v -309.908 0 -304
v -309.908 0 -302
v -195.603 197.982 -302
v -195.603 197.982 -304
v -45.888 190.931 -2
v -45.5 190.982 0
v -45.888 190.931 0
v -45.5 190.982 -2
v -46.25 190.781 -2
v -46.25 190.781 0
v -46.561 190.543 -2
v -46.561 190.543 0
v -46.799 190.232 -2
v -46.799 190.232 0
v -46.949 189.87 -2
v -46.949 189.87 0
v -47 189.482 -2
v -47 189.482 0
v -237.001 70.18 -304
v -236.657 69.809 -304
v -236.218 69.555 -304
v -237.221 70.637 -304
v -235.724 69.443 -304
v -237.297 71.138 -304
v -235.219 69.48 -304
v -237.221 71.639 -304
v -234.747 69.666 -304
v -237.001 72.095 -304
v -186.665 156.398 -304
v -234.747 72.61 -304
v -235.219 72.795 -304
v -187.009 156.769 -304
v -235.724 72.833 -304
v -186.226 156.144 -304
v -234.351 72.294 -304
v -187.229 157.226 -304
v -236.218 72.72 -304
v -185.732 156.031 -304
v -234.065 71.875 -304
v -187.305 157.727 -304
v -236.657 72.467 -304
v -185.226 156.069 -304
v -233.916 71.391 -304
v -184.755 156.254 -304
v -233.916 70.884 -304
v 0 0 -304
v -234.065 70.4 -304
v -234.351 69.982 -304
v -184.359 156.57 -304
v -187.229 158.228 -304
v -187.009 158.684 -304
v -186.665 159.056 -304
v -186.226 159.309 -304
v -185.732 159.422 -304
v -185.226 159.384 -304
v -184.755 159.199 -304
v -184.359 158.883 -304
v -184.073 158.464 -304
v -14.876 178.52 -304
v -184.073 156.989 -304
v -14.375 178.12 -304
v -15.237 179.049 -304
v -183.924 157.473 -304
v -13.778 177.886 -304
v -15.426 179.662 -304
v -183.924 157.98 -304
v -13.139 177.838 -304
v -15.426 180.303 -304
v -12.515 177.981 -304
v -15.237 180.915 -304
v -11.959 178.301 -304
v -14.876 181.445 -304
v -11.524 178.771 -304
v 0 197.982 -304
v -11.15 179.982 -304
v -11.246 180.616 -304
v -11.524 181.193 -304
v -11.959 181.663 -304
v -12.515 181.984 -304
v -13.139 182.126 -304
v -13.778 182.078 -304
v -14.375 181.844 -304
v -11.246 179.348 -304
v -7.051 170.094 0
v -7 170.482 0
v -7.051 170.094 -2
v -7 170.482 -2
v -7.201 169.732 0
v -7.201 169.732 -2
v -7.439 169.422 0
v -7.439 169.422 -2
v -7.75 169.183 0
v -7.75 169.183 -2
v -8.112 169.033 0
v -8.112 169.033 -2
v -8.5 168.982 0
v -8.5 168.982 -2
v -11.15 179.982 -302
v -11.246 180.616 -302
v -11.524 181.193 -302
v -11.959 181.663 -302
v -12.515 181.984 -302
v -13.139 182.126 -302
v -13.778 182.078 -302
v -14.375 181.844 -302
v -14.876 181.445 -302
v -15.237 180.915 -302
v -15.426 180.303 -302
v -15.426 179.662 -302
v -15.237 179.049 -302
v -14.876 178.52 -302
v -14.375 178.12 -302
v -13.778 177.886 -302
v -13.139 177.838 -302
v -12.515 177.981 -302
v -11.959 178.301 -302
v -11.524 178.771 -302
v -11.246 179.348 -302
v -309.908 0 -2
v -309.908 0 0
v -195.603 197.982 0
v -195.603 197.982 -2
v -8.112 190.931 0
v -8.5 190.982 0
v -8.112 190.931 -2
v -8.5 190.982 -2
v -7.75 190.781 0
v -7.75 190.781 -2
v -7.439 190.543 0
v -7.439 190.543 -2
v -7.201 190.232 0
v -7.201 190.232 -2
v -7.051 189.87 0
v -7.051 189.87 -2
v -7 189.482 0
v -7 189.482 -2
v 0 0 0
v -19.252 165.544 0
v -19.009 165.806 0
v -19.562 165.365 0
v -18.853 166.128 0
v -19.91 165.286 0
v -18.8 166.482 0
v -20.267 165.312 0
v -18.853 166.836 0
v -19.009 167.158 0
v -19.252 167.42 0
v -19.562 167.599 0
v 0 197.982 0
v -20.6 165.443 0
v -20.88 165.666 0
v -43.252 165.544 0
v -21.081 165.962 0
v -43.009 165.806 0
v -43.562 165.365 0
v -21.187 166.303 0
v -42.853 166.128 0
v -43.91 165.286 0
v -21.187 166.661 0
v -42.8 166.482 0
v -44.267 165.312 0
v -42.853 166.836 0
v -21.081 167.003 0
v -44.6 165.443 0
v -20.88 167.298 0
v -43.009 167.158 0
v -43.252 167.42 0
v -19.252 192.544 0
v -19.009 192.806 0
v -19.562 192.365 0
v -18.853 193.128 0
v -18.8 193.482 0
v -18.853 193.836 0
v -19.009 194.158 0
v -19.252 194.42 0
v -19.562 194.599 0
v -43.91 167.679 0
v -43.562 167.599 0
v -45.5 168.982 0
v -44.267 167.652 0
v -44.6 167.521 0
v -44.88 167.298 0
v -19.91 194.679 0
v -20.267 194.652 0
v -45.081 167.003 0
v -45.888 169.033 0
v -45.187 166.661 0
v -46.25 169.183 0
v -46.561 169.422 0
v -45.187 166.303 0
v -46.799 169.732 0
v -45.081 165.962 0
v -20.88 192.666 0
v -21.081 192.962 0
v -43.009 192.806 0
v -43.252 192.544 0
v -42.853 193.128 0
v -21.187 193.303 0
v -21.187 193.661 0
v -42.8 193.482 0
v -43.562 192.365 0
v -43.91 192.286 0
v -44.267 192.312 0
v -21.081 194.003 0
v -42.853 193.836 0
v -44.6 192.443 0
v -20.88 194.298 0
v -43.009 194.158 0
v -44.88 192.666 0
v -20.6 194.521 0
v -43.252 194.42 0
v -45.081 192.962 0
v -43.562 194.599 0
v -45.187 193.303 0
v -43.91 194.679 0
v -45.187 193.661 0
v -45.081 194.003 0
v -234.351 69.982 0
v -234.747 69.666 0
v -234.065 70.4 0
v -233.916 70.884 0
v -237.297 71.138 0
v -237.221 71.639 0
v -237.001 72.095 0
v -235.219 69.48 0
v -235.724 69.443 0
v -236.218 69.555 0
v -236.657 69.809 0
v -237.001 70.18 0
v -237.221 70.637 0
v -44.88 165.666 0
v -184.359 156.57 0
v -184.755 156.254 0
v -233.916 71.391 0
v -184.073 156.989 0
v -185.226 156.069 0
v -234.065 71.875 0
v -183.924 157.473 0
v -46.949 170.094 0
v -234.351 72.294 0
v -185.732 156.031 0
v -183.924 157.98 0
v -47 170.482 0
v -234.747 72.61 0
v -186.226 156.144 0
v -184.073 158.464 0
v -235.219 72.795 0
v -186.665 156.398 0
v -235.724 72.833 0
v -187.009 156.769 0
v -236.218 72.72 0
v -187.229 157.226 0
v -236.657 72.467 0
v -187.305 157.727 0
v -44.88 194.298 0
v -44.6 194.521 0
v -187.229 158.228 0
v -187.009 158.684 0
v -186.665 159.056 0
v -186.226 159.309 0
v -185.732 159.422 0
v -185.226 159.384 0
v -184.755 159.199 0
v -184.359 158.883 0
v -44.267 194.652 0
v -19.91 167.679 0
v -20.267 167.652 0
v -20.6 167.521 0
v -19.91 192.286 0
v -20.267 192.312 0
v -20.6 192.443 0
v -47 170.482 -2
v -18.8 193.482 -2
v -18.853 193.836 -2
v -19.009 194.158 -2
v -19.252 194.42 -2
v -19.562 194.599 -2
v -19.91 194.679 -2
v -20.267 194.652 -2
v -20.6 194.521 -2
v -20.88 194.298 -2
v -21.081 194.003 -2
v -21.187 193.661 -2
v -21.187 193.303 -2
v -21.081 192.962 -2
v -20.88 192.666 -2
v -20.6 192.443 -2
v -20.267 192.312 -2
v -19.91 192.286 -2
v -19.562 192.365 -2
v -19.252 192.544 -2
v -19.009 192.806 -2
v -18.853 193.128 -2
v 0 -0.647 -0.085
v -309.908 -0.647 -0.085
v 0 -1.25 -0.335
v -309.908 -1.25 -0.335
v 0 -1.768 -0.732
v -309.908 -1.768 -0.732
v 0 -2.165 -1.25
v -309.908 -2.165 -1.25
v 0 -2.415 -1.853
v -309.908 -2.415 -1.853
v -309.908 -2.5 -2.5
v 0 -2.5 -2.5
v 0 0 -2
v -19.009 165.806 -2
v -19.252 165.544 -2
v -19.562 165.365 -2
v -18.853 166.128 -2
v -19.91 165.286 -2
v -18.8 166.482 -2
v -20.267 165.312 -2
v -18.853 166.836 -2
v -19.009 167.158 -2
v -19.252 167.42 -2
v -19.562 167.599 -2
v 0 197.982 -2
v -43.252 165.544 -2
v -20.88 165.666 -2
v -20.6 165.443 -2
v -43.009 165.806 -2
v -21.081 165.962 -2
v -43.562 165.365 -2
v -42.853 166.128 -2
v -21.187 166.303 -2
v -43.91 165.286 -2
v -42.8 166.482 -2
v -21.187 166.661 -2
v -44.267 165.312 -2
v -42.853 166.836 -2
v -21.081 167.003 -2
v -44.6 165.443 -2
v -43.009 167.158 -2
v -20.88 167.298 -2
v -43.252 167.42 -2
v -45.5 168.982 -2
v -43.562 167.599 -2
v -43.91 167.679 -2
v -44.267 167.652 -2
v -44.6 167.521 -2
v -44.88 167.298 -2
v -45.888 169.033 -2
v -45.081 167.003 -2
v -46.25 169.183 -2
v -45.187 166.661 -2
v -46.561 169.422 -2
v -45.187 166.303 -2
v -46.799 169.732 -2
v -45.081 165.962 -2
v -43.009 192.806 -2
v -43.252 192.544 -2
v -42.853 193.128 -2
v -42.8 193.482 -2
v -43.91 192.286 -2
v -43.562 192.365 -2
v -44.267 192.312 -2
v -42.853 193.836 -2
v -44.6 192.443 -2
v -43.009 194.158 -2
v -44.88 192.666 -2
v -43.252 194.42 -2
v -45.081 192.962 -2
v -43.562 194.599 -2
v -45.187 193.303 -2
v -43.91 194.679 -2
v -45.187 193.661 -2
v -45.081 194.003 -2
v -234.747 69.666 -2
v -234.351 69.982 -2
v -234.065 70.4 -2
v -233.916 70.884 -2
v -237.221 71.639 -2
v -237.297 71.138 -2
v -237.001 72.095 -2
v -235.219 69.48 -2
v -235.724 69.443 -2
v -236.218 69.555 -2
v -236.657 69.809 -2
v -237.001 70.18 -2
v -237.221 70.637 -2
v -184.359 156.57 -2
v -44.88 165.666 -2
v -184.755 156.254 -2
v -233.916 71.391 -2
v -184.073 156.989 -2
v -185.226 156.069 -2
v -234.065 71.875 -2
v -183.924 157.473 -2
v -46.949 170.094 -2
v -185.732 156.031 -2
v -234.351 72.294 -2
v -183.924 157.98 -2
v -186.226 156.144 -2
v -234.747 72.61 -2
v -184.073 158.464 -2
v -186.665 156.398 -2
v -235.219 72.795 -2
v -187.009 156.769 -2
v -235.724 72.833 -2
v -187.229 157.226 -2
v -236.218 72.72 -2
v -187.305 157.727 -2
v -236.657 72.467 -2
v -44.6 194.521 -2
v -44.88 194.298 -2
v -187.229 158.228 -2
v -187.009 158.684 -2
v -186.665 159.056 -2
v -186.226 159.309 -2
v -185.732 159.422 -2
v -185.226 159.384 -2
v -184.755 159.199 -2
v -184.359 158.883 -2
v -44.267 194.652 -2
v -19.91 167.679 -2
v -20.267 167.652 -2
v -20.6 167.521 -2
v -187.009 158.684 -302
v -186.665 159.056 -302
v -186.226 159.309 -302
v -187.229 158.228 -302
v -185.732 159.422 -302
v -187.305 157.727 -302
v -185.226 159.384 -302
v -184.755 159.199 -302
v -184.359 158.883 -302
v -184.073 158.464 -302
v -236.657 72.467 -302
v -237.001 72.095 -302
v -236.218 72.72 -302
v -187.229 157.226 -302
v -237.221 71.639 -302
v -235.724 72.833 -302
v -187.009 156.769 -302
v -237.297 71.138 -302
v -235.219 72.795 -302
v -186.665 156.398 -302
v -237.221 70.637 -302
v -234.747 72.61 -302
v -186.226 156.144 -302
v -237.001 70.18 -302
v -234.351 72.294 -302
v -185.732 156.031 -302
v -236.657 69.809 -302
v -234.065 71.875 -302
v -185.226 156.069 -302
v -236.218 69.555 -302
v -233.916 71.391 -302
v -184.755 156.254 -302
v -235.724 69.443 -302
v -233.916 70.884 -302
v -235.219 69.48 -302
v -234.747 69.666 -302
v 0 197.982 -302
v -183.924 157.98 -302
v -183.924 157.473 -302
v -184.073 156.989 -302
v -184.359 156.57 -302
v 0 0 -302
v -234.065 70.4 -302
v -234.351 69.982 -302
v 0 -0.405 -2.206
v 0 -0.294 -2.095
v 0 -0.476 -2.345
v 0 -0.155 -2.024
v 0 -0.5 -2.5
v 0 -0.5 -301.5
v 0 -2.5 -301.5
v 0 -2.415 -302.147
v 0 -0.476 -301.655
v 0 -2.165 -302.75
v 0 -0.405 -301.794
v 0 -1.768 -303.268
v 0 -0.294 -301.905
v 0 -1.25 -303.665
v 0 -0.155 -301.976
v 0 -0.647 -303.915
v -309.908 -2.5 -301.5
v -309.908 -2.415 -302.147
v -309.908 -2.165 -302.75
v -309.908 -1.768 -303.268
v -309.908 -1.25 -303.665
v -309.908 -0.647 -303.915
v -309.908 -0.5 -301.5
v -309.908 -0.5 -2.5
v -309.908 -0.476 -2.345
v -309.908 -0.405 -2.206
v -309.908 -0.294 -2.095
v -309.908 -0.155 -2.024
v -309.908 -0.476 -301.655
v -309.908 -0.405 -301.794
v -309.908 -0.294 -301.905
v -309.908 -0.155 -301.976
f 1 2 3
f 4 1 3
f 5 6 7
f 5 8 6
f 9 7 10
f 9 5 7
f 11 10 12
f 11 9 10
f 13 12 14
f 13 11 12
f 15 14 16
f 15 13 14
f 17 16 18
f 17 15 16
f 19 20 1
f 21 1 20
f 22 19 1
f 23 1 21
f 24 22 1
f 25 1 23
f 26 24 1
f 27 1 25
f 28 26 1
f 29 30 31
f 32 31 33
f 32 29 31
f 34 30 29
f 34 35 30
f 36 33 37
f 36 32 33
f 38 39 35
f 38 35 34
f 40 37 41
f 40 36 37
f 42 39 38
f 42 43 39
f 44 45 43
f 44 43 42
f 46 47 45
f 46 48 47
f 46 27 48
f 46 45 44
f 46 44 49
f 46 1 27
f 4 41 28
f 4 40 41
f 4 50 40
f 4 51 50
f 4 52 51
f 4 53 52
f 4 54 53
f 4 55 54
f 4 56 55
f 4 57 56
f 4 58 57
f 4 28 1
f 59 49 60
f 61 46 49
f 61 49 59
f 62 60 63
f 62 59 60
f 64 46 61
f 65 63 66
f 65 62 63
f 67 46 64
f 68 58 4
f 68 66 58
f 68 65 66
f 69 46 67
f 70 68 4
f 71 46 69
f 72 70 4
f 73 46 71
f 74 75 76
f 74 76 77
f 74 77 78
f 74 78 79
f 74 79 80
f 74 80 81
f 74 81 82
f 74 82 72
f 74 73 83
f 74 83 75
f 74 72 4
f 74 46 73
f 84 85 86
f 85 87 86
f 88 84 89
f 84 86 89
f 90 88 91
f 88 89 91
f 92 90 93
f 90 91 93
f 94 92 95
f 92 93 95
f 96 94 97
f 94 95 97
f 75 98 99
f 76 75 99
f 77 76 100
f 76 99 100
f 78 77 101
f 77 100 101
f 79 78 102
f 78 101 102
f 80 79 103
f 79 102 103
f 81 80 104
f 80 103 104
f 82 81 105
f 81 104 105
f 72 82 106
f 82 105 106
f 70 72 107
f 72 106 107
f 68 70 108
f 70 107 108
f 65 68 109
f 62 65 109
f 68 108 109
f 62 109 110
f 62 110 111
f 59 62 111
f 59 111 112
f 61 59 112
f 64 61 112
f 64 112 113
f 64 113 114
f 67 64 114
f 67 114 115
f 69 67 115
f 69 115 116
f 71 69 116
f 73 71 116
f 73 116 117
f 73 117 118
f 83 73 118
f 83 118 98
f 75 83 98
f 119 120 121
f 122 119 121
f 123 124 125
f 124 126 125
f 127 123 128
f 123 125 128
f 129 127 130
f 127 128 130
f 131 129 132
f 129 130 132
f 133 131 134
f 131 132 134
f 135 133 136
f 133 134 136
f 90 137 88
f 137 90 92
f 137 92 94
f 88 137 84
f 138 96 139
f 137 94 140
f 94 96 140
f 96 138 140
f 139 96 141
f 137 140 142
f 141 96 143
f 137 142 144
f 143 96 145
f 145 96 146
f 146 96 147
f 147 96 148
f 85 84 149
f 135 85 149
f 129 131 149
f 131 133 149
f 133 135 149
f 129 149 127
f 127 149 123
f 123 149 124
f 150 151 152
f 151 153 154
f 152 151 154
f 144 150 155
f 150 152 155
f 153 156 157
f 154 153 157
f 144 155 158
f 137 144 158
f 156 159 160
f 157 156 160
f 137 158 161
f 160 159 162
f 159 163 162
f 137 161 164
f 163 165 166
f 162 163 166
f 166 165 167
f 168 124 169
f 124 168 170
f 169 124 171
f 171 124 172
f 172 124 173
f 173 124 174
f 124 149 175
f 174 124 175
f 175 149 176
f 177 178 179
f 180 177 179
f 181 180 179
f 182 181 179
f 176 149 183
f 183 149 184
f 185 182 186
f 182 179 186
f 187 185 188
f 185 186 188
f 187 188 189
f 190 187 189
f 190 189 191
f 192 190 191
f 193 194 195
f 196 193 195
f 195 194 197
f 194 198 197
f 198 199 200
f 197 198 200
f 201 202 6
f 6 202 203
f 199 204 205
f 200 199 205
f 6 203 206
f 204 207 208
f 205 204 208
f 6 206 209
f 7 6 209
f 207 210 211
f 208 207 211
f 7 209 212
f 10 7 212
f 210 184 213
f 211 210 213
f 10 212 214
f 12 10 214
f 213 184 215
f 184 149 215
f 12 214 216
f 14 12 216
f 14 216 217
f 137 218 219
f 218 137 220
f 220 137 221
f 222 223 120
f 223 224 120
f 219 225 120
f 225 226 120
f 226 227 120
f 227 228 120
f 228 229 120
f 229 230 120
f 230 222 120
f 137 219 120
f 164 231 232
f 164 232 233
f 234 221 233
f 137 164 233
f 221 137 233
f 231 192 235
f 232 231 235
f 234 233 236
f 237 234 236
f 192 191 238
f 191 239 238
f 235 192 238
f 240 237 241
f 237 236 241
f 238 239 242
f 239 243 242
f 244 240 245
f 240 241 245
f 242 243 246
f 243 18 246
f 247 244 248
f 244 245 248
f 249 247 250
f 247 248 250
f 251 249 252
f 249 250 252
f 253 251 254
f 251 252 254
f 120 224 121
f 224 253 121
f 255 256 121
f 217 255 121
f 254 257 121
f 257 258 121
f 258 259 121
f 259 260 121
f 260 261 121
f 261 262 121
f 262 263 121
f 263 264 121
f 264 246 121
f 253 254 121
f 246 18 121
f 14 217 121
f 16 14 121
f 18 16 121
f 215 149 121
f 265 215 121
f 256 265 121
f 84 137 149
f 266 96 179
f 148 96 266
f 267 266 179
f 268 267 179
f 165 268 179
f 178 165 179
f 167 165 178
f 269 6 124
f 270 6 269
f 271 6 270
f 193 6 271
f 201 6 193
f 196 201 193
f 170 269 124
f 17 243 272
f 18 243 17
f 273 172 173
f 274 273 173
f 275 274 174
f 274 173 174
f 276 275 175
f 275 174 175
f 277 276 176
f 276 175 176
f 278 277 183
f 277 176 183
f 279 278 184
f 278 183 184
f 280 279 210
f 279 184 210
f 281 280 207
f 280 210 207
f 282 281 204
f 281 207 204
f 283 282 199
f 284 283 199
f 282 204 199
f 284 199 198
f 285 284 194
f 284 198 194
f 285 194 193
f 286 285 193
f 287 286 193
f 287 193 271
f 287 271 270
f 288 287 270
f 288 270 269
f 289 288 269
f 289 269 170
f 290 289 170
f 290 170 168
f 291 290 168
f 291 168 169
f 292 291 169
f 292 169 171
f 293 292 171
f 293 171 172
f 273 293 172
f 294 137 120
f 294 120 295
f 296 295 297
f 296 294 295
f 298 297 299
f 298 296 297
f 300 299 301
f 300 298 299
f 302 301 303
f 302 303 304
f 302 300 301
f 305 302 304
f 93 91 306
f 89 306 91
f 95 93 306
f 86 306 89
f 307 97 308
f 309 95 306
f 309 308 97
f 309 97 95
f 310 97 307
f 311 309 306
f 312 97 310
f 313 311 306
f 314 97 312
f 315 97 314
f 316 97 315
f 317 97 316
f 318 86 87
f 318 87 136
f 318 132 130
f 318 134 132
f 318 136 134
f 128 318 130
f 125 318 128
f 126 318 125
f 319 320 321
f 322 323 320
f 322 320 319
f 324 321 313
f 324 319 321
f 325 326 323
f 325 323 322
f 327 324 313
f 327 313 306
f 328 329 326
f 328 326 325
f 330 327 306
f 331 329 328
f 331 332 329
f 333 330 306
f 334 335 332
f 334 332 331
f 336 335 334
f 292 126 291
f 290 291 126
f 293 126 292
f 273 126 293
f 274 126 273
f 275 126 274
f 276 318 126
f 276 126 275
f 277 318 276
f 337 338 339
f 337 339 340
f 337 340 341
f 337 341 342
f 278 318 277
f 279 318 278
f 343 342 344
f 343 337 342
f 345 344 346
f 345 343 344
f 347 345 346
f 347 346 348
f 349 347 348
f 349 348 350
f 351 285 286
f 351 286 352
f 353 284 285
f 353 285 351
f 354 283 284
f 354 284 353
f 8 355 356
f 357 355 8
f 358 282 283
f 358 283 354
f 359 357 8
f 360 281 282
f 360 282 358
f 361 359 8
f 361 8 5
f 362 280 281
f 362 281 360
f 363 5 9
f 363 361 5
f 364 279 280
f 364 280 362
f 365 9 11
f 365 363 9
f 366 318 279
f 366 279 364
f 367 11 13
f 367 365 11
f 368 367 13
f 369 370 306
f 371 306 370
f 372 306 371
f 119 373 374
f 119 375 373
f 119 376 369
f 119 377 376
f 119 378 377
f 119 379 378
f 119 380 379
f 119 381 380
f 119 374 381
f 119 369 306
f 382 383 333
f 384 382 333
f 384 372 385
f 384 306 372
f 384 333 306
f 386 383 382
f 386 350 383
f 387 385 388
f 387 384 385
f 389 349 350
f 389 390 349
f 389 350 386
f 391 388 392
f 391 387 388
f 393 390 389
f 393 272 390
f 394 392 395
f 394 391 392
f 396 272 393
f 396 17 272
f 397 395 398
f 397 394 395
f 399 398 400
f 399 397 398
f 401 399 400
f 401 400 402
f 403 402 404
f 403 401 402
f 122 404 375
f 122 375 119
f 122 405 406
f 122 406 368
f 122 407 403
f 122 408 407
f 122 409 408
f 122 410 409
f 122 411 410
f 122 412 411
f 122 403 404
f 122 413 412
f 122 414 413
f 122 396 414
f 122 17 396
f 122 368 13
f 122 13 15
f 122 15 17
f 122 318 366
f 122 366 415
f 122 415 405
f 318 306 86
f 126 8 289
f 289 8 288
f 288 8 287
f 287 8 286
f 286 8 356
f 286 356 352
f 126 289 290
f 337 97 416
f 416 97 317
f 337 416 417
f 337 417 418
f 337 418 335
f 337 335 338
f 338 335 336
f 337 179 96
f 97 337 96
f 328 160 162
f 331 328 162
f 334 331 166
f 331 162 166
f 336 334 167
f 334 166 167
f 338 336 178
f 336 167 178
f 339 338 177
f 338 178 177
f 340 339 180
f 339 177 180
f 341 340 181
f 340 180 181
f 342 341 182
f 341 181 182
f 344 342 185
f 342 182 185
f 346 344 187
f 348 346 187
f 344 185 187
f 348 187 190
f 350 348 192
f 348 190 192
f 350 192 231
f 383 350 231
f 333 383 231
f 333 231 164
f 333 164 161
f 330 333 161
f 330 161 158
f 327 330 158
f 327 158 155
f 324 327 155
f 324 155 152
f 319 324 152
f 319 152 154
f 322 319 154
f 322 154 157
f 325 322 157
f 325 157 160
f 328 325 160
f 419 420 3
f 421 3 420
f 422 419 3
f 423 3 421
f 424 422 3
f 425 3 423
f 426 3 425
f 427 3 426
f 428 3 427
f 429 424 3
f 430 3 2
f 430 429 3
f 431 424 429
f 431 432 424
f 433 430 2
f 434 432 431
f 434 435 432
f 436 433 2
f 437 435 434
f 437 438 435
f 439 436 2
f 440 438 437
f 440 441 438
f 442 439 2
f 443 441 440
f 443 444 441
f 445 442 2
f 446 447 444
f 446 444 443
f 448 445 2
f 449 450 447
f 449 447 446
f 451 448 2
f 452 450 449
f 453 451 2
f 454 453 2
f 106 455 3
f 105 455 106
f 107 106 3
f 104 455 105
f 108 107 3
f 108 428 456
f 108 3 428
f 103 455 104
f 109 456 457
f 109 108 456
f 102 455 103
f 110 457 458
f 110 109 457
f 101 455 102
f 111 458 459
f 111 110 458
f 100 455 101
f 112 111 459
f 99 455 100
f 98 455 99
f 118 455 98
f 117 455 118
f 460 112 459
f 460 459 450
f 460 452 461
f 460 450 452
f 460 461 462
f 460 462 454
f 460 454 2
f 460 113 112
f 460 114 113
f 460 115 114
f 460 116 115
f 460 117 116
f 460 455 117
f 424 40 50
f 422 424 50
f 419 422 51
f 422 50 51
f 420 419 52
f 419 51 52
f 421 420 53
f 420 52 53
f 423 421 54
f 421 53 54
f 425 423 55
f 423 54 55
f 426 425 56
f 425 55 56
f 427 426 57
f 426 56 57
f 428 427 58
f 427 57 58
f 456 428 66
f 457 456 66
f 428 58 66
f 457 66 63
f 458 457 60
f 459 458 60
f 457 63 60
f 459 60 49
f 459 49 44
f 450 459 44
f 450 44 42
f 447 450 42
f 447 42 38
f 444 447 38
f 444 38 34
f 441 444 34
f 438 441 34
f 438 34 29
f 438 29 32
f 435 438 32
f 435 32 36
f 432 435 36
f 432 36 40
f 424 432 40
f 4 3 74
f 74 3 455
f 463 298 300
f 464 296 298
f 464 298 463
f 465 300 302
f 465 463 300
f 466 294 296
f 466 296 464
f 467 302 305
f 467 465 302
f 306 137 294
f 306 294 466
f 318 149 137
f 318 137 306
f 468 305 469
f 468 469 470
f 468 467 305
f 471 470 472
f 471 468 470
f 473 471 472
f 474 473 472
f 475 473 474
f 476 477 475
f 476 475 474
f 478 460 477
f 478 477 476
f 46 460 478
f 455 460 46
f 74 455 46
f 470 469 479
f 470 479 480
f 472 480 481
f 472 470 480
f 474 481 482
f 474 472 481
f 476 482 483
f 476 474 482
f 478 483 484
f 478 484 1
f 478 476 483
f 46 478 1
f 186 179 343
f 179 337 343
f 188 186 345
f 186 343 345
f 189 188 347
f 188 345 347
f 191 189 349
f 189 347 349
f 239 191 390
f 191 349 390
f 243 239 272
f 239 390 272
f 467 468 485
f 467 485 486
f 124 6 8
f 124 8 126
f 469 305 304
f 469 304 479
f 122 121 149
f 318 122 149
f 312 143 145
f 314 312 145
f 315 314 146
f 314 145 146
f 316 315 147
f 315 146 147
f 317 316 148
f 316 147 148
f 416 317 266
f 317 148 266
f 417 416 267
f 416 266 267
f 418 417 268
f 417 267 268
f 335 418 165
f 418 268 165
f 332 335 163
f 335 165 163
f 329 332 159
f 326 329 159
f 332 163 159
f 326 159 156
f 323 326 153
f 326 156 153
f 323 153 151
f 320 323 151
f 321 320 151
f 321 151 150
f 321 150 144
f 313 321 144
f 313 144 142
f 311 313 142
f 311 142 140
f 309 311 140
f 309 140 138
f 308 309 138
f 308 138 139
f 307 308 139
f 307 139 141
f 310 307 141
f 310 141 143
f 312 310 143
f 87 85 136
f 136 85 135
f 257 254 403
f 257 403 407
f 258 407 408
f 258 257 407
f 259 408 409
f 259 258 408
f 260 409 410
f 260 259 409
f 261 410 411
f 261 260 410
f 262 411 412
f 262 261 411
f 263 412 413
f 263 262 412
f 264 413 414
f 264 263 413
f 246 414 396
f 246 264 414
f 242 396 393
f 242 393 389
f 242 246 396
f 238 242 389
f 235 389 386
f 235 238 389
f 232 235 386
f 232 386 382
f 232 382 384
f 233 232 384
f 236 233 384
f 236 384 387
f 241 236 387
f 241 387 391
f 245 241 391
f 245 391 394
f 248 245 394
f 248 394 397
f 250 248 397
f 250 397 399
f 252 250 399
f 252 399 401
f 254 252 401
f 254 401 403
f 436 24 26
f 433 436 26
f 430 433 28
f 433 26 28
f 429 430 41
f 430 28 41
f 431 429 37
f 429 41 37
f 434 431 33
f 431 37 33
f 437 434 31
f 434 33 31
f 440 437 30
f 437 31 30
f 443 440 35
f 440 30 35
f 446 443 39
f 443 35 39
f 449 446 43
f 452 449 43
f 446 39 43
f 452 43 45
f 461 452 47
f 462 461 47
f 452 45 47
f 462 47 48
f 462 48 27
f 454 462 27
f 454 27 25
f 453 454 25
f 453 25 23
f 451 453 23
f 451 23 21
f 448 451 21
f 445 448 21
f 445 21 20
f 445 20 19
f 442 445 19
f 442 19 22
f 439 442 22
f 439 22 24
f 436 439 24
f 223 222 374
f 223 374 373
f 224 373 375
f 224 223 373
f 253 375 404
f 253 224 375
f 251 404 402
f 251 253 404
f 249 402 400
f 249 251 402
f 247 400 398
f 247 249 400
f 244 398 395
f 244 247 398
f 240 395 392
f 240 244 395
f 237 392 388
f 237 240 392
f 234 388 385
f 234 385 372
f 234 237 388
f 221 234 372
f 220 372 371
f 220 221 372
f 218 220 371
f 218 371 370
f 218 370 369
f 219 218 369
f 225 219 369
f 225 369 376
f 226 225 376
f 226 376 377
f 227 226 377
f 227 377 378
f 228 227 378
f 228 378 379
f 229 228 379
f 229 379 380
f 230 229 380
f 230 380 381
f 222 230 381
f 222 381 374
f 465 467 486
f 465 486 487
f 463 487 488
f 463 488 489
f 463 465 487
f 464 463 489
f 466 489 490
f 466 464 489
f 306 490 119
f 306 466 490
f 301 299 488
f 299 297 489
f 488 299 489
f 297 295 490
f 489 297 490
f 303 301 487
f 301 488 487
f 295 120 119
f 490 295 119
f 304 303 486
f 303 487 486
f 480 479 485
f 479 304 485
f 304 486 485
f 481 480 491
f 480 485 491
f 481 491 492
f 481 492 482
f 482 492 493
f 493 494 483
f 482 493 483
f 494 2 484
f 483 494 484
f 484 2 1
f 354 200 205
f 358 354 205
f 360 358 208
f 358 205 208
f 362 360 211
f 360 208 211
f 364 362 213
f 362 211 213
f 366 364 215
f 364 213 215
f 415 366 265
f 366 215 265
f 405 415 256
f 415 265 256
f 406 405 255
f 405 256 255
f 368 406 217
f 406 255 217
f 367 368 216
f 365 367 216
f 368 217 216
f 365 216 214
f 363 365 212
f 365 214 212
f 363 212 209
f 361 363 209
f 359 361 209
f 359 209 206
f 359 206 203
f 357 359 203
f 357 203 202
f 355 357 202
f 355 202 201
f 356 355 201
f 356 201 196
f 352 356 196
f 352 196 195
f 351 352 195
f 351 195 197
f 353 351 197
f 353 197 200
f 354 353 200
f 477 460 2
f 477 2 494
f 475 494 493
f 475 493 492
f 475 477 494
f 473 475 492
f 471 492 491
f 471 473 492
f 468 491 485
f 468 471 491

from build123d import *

# Parameters (mm, degrees)
BASE_FLANGE2_DEPTH           = 2
EDGE_FLANGE1_DEPTH           = 309.908043232
EDGE_FLANGE2_STRIP_W         = 9
EDGE_FLANGE2_STRIP_H         = 2
EDGE_FLANGE2_STRIP_CUT_DEPTH = 309.908043232
EDGE_FLANGE2_DEPTH           = 309.908043232
SKETCH23_OUTSIDE_W           = 414.366
SKETCH23_OUTSIDE_H           = 376.458
CUT_EXTRUDE3_DEPTH           = 510.781566222
M3_CLEARANCE_HOLE1_REACH     = 479.133
M3_CLEARANCE_HOLE1_BORE_R    = 1.7
SKETCH50_R                   = 1.2
SKETCH50_W                   = 40
SKETCH50_H                   = 22
CUT_EXTRUDE5_DEPTH           = 10
FILLET1_R                    = 1.5
M4_CLEARANCE_HOLE2_D         = 4.3
M3_CLEARANCE_HOLE2_REACH     = 479.133
M3_CLEARANCE_HOLE2_BORE_R    = 1.7


# Sheet-metal steps are written as plain solids
with BuildPart() as part:
    # Sketch7 → Base-Flange2 (new body)
    with BuildSketch(Plane.XY):
        Polygon((-309.908043232, 0), (-195.602983964, 197.982170213), (0, 197.982170213), (0, 0), align=None)
    extrude(amount=-BASE_FLANGE2_DEPTH)

    # Edge-Flange1 section (across the edge) → Edge-Flange1 (add)
    with BuildSketch(Plane(origin=(0, -0.5, -2), x_dir=(0, 1, 0), z_dir=(-1, 0, 0))):
        with BuildLine():
            Line((-2, 0.5), (-2, 300))
            Line((-2, 300), (0, 300))
            Line((0, 300), (0, 0.5))
            ThreePointArc((0, 0.5), (0.146446609, 0.146446609), (0.5, 0))
            Line((0.5, 0), (0.5, -2))
            ThreePointArc((0.5, -2), (-1.267766953, -1.267766953), (-2, 0.5))
        make_face()
    extrude(amount=EDGE_FLANGE1_DEPTH)

    # Edge-Flange2 strip (across the edge) → Edge-Flange2 strip cut (cut)
    with BuildSketch(Plane(origin=(0, -0.5, -302), x_dir=(0, 0, 1), z_dir=(-1, 0, 0))):
        with Locations((-4, -1)):
            Rectangle(EDGE_FLANGE2_STRIP_W, EDGE_FLANGE2_STRIP_H)
    extrude(amount=EDGE_FLANGE2_STRIP_CUT_DEPTH, mode=Mode.SUBTRACT)

    # Edge-Flange2 section (across the edge) → Edge-Flange2 (add)
    with BuildSketch(Plane(origin=(0, -0.5, -302), x_dir=(0, 0, 1), z_dir=(-1, 0, 0))):
        with BuildLine():
            Line((-2, 0.5), (-2, 270))
            Line((-2, 270), (0, 270))
            Line((0, 270), (0, 0.5))
            ThreePointArc((0, 0.5), (0.146446609, 0.146446609), (0.5, 0))
            Line((0.5, 0), (0.5, -2))
            ThreePointArc((0.5, -2), (-1.267766953, -1.267766953), (-2, 0.5))
        make_face()
    extrude(amount=EDGE_FLANGE2_DEPTH)

    # Sketch23 outside → Cut-Extrude3 (cut, through all)
    with BuildSketch(Plane.XY.offset(-302)):
        with Locations((-154.954, 133.5)):
            Rectangle(SKETCH23_OUTSIDE_W, SKETCH23_OUTSIDE_H)
        Polygon((-309.908043232, 0), (-195.602983964, 197.982170213), (0, 197.982170213), (0, 0), (15.914954138, -38.535343566), (-328.412515317, -22.782185248), align=None, mode=Mode.SUBTRACT)
    extrude(amount=-CUT_EXTRUDE3_DEPTH, mode=Mode.SUBTRACT)

    # M3 Clearance Hole1 bore → M3 Clearance Hole1 (cut, up to next)
    with BuildSketch(Plane(origin=(0, 0, -304), x_dir=(-1, 0, 0), z_dir=(0, 0, -1)), mode=Mode.PRIVATE) as m3_clearance_hole1_sk1:
        with Locations((235.596855298, 71.137815764)):
            Circle(M3_CLEARANCE_HOLE1_BORE_R)
    m3_clearance_hole1_tool1 = extrude(m3_clearance_hole1_sk1.sketch, amount=-M3_CLEARANCE_HOLE1_REACH, mode=Mode.PRIVATE) & part.part
    m3_clearance_hole1 = m3_clearance_hole1_tool1.solids().sort_by_distance((-235.596855, 71.137816, -304))[0]
    add(m3_clearance_hole1, mode=Mode.SUBTRACT)

    # Mirror3: M3 Clearance Hole1 across plane
    add(m3_clearance_hole1.mirror(Plane.XY.offset(-152)), mode=Mode.SUBTRACT)

    # Sketch50 → Cut-Extrude5 (cut)
    with BuildSketch(Plane.XY):
        with Locations((-20, 193.482170213)):
            Circle(SKETCH50_R)
        with Locations((-20, 166.482170213)):
            Circle(SKETCH50_R)
        with Locations((-44, 193.482170213)):
            Circle(SKETCH50_R)
        with Locations((-44, 166.482170213)):
            Circle(SKETCH50_R)
        with Locations((-27, 179.982170213)):
            Rectangle(SKETCH50_W, SKETCH50_H)
    extrude(amount=-CUT_EXTRUDE5_DEPTH, mode=Mode.SUBTRACT)

    # Fillet1
    fillet1_edges = [part.edges().sort_by_distance(p)[0] for p in [
        (-47, 168.982170213, -1),
        (-47, 190.982170213, -1),
        (-7, 190.982170213, -1),
        (-7, 168.982170213, -1),
    ]]
    fillet(fillet1_edges, radius=FILLET1_R)

    # M4 Clearance Hole2 (through all)
    with Locations(Plane(origin=(0, 0, -304), x_dir=(-1, 0, 0), z_dir=(0, 0, -1))):
        with Locations((13.3, 179.982170213)):
            Hole(M4_CLEARANCE_HOLE2_D / 2)

    # M3 Clearance Hole2 bore → M3 Clearance Hole2 (cut, up to next)
    with BuildSketch(Plane(origin=(0, 0, -304), x_dir=(-1, 0, 0), z_dir=(0, 0, -1)), mode=Mode.PRIVATE) as m3_clearance_hole2_sk1:
        with Locations((185.604770825, 157.726646048)):
            Circle(M3_CLEARANCE_HOLE2_BORE_R)
    m3_clearance_hole2_tool1 = extrude(m3_clearance_hole2_sk1.sketch, amount=-M3_CLEARANCE_HOLE2_REACH, mode=Mode.PRIVATE) & part.part
    m3_clearance_hole2 = m3_clearance_hole2_tool1.solids().sort_by_distance((-185.604771, 157.726646, -304))[0]
    add(m3_clearance_hole2, mode=Mode.SUBTRACT)

    # Mirror4: M3 Clearance Hole2 across plane
    add(m3_clearance_hole2.mirror(Plane.XY.offset(-152)), mode=Mode.SUBTRACT)


solid = part.part
